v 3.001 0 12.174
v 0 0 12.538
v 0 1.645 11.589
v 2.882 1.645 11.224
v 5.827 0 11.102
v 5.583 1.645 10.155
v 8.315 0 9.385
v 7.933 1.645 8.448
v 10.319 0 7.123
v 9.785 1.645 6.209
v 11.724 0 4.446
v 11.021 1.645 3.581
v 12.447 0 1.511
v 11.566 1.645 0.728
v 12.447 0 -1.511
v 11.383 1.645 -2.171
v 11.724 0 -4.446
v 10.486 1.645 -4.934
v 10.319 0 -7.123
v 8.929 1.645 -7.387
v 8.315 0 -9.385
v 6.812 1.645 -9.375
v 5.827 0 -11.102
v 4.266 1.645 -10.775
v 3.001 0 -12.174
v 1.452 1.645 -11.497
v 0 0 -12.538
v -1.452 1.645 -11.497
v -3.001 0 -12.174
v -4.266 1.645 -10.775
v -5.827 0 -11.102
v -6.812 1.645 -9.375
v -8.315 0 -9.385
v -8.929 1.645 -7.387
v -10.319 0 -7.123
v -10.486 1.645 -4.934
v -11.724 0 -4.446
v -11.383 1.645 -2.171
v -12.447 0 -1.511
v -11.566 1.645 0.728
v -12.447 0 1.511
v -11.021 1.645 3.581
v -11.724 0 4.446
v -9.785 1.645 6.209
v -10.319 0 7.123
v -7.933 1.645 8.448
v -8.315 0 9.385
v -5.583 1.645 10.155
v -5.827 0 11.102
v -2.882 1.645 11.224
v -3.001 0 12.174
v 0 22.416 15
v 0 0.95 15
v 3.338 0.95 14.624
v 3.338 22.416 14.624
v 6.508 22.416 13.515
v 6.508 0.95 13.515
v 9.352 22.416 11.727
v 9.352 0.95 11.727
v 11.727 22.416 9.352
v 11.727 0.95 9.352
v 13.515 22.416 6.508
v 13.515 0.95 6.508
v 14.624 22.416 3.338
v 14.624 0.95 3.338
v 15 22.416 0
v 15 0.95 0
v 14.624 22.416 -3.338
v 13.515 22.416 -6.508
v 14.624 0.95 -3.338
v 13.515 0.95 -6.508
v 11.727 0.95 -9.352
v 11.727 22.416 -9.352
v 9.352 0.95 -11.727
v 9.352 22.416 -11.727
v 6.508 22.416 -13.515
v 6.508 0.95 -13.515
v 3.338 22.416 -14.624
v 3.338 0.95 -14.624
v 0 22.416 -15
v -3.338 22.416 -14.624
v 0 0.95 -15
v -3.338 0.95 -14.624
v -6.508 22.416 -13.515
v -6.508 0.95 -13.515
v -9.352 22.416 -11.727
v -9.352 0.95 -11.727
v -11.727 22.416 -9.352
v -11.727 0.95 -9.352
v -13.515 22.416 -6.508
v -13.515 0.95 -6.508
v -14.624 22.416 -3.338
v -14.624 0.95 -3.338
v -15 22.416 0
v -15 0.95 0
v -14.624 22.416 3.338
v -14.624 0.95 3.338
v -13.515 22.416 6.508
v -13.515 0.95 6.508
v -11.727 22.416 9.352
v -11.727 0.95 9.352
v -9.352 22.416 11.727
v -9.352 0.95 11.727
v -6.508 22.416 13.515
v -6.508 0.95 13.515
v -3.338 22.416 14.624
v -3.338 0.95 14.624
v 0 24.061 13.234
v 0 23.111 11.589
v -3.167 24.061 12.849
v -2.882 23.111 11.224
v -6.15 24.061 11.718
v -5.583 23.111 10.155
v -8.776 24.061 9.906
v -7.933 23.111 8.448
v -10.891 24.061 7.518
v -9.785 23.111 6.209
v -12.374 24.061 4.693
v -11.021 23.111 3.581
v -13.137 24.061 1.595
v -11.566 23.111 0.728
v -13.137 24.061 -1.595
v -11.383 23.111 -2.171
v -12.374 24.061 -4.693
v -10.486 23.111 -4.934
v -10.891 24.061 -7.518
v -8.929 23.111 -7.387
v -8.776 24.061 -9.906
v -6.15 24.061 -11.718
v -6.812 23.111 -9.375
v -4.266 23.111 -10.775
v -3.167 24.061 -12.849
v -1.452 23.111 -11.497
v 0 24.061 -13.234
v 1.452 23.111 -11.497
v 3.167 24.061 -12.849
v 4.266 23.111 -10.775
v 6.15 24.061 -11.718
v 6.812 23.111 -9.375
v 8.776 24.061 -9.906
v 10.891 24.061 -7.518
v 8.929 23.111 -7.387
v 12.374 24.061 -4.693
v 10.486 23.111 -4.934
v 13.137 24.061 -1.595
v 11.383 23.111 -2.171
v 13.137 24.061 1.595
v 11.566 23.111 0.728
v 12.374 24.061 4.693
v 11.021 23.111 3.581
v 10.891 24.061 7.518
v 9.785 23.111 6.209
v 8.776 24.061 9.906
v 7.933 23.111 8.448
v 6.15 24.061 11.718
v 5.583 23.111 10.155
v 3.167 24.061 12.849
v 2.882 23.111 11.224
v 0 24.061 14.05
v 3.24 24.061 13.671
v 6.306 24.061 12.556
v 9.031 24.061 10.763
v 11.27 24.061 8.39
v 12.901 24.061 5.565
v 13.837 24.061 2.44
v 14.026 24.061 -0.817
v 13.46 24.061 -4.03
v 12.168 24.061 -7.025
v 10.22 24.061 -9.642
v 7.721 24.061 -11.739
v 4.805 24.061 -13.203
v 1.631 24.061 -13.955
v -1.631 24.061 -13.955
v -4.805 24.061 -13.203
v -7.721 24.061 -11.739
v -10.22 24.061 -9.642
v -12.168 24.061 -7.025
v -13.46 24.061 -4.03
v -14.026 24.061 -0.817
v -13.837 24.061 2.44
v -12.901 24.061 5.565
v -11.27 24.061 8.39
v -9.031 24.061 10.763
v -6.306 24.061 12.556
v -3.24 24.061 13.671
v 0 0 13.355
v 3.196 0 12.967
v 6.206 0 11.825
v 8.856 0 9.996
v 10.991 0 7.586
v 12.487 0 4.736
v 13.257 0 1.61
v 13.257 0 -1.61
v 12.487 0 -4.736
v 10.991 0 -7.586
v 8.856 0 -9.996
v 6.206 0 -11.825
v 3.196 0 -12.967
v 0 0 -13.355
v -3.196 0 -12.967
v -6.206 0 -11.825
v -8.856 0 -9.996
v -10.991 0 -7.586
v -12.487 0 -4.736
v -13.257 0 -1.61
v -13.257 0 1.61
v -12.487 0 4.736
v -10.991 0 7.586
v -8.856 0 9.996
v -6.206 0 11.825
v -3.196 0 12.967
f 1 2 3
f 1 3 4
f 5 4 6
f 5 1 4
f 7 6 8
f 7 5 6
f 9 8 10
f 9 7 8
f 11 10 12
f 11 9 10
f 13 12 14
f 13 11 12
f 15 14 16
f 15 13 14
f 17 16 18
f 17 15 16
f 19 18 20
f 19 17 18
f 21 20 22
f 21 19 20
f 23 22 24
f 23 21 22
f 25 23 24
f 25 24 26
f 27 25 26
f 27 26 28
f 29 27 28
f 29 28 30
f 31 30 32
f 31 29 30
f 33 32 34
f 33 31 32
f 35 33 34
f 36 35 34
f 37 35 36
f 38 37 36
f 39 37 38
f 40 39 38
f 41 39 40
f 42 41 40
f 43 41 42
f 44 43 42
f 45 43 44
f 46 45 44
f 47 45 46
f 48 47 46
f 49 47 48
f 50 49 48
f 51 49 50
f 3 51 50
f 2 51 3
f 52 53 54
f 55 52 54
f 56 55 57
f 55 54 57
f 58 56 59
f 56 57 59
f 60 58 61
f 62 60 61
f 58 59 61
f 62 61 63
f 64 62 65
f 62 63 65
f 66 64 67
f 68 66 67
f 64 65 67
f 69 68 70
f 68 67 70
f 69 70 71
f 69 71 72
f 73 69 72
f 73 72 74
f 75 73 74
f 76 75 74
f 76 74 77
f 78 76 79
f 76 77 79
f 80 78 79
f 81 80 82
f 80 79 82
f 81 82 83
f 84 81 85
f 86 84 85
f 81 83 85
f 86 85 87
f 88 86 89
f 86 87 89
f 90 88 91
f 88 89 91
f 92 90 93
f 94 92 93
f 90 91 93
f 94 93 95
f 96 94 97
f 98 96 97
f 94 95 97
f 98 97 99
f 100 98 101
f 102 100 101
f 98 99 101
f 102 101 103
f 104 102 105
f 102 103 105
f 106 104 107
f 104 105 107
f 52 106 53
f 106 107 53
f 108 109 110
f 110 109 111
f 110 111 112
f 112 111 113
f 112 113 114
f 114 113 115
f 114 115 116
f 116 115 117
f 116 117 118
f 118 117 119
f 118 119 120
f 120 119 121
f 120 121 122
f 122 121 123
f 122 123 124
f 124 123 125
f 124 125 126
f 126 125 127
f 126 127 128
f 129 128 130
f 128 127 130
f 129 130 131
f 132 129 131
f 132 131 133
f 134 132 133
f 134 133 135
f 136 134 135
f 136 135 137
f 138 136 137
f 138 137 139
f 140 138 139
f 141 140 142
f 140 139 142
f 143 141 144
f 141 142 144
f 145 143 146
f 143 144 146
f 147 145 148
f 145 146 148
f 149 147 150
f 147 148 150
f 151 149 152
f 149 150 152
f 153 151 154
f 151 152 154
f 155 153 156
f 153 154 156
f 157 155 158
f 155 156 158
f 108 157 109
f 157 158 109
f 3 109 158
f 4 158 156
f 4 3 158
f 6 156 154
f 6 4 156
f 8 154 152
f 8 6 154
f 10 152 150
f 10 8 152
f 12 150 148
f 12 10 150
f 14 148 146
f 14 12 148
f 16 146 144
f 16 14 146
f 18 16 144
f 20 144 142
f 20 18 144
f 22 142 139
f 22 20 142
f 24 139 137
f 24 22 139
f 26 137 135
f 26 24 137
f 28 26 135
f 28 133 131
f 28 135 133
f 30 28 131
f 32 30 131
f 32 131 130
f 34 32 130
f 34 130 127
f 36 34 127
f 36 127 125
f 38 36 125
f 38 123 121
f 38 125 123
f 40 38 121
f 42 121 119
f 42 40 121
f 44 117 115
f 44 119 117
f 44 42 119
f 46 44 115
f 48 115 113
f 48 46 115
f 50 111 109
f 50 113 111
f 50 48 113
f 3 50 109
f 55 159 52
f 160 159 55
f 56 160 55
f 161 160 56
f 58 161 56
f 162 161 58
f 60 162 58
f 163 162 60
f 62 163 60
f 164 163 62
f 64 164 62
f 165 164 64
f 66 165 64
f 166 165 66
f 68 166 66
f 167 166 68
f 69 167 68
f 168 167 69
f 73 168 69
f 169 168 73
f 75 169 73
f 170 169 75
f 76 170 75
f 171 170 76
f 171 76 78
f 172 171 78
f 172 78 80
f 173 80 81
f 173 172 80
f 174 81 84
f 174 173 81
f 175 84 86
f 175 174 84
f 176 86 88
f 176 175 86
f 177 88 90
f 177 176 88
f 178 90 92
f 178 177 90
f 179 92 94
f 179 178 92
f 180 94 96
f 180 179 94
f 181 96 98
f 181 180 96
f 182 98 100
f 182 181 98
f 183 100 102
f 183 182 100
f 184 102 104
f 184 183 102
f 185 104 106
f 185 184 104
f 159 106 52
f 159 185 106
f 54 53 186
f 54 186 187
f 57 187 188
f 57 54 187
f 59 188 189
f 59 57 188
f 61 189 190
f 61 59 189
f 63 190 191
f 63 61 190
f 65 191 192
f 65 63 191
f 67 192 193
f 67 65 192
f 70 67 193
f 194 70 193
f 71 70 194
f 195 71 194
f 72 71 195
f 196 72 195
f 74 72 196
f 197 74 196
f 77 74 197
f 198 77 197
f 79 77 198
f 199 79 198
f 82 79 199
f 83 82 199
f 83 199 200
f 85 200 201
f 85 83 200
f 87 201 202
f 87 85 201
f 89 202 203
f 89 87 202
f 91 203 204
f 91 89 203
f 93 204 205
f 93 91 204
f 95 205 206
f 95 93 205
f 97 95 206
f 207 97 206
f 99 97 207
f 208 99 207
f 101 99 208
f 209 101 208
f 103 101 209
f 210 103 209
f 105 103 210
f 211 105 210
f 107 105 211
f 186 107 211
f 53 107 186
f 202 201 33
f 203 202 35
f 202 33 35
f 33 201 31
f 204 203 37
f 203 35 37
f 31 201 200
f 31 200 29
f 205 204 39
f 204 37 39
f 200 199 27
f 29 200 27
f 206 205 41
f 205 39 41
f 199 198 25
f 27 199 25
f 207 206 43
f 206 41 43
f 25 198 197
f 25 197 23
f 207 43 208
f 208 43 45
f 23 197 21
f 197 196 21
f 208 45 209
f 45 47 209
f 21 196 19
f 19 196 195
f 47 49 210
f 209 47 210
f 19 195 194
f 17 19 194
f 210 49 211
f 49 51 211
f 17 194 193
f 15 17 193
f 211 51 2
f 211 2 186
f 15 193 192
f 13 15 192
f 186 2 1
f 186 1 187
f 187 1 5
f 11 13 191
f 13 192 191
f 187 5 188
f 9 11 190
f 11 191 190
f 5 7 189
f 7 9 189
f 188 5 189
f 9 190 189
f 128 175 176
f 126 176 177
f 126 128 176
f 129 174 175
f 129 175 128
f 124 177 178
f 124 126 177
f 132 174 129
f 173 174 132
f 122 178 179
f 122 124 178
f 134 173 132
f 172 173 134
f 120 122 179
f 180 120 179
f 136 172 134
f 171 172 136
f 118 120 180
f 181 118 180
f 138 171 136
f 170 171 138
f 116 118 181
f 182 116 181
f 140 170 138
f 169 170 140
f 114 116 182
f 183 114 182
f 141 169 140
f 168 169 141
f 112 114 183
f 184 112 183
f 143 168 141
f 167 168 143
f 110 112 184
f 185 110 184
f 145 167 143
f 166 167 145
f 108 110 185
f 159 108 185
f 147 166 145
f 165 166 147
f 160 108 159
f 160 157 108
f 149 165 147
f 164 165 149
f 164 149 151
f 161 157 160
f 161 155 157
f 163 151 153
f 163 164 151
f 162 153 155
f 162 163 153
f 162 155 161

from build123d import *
from OCP.BRepFilletAPI import BRepFilletAPI_MakeChamfer

# Parameters (mm, degrees)
SKETCH1_R           = 15
BOSS_EXTRUDE1_DEPTH = 24.06085588
SKETCH2_R           = 11.588546068
CUT_EXTRUDE1_DEPTH  = 33.076857478
CHAMFER1_SIZE       = 1.645344367
CHAMFER1_SIZE2      = 0.949940013


with BuildPart() as part:
    # Sketch1 → Boss-Extrude1 (new body)
    with BuildSketch(Plane(origin=(0, 0, 0), x_dir=(1, 0, 0), z_dir=(0, 1, 0))):
        Circle(SKETCH1_R)
    extrude(amount=BOSS_EXTRUDE1_DEPTH)

    # Sketch2 → Cut-Extrude1 (cut, through all)
    with BuildSketch(Plane(origin=(0, 0, 0), x_dir=(1, 0, 0), z_dir=(0, 1, 0))):
        Circle(SKETCH2_R)
    extrude(amount=CUT_EXTRUDE1_DEPTH, mode=Mode.SUBTRACT)

    # Chamfer1: one chamfer whose edges measure the first distance from different faces: ONE call of the kernel's chamfer builder (chamfer() names one face for all edges)
    chamfer1_edges_1 = [part.edges().sort_by_distance(p)[0] for p in [
        (-11.588546068, 24.06085588, 0),
    ]]
    chamfer1_side_1 = [part.faces().sort_by_distance(p)[0] for p in [
        (-14.575735931, 24.06085588, 0),
    ]]
    chamfer1_edges_2 = [part.edges().sort_by_distance(p)[0] for p in [
        (-11.588546068, 0, 0),
    ]]
    chamfer1_side_2 = [part.faces().sort_by_distance(p)[0] for p in [
        (-11.588546068, 12.03042794, 0),
    ]]
    chamfer1_edges_3 = [part.edges().sort_by_distance(p)[0] for p in [
        (-15, 0, 0),
    ]]
    chamfer1_side_3 = [part.faces().sort_by_distance(p)[0] for p in [
        (-14.575735931, 0, 0),
    ]]
    chamfer1_edges_4 = [part.edges().sort_by_distance(p)[0] for p in [
        (-15, 24.06085588, 0),
    ]]
    chamfer1_side_4 = [part.faces().sort_by_distance(p)[0] for p in [
        (-15, 12.03042794, 0),
    ]]
    chamfer1 = BRepFilletAPI_MakeChamfer(part.part.solid().wrapped)
    for e in chamfer1_edges_1:
        chamfer1.Add(CHAMFER1_SIZE, CHAMFER1_SIZE2, e.wrapped, chamfer1_side_1[0].wrapped)  # the first distance lies on this face
    for e in chamfer1_edges_2:
        chamfer1.Add(CHAMFER1_SIZE, CHAMFER1_SIZE2, e.wrapped, chamfer1_side_2[0].wrapped)  # the first distance lies on this face
    for e in chamfer1_edges_3:
        chamfer1.Add(CHAMFER1_SIZE, CHAMFER1_SIZE2, e.wrapped, chamfer1_side_3[0].wrapped)  # the first distance lies on this face
    for e in chamfer1_edges_4:
        chamfer1.Add(CHAMFER1_SIZE, CHAMFER1_SIZE2, e.wrapped, chamfer1_side_4[0].wrapped)  # the first distance lies on this face
    add(Compound.cast(chamfer1.Shape()), mode=Mode.REPLACE)


solid = part.part
